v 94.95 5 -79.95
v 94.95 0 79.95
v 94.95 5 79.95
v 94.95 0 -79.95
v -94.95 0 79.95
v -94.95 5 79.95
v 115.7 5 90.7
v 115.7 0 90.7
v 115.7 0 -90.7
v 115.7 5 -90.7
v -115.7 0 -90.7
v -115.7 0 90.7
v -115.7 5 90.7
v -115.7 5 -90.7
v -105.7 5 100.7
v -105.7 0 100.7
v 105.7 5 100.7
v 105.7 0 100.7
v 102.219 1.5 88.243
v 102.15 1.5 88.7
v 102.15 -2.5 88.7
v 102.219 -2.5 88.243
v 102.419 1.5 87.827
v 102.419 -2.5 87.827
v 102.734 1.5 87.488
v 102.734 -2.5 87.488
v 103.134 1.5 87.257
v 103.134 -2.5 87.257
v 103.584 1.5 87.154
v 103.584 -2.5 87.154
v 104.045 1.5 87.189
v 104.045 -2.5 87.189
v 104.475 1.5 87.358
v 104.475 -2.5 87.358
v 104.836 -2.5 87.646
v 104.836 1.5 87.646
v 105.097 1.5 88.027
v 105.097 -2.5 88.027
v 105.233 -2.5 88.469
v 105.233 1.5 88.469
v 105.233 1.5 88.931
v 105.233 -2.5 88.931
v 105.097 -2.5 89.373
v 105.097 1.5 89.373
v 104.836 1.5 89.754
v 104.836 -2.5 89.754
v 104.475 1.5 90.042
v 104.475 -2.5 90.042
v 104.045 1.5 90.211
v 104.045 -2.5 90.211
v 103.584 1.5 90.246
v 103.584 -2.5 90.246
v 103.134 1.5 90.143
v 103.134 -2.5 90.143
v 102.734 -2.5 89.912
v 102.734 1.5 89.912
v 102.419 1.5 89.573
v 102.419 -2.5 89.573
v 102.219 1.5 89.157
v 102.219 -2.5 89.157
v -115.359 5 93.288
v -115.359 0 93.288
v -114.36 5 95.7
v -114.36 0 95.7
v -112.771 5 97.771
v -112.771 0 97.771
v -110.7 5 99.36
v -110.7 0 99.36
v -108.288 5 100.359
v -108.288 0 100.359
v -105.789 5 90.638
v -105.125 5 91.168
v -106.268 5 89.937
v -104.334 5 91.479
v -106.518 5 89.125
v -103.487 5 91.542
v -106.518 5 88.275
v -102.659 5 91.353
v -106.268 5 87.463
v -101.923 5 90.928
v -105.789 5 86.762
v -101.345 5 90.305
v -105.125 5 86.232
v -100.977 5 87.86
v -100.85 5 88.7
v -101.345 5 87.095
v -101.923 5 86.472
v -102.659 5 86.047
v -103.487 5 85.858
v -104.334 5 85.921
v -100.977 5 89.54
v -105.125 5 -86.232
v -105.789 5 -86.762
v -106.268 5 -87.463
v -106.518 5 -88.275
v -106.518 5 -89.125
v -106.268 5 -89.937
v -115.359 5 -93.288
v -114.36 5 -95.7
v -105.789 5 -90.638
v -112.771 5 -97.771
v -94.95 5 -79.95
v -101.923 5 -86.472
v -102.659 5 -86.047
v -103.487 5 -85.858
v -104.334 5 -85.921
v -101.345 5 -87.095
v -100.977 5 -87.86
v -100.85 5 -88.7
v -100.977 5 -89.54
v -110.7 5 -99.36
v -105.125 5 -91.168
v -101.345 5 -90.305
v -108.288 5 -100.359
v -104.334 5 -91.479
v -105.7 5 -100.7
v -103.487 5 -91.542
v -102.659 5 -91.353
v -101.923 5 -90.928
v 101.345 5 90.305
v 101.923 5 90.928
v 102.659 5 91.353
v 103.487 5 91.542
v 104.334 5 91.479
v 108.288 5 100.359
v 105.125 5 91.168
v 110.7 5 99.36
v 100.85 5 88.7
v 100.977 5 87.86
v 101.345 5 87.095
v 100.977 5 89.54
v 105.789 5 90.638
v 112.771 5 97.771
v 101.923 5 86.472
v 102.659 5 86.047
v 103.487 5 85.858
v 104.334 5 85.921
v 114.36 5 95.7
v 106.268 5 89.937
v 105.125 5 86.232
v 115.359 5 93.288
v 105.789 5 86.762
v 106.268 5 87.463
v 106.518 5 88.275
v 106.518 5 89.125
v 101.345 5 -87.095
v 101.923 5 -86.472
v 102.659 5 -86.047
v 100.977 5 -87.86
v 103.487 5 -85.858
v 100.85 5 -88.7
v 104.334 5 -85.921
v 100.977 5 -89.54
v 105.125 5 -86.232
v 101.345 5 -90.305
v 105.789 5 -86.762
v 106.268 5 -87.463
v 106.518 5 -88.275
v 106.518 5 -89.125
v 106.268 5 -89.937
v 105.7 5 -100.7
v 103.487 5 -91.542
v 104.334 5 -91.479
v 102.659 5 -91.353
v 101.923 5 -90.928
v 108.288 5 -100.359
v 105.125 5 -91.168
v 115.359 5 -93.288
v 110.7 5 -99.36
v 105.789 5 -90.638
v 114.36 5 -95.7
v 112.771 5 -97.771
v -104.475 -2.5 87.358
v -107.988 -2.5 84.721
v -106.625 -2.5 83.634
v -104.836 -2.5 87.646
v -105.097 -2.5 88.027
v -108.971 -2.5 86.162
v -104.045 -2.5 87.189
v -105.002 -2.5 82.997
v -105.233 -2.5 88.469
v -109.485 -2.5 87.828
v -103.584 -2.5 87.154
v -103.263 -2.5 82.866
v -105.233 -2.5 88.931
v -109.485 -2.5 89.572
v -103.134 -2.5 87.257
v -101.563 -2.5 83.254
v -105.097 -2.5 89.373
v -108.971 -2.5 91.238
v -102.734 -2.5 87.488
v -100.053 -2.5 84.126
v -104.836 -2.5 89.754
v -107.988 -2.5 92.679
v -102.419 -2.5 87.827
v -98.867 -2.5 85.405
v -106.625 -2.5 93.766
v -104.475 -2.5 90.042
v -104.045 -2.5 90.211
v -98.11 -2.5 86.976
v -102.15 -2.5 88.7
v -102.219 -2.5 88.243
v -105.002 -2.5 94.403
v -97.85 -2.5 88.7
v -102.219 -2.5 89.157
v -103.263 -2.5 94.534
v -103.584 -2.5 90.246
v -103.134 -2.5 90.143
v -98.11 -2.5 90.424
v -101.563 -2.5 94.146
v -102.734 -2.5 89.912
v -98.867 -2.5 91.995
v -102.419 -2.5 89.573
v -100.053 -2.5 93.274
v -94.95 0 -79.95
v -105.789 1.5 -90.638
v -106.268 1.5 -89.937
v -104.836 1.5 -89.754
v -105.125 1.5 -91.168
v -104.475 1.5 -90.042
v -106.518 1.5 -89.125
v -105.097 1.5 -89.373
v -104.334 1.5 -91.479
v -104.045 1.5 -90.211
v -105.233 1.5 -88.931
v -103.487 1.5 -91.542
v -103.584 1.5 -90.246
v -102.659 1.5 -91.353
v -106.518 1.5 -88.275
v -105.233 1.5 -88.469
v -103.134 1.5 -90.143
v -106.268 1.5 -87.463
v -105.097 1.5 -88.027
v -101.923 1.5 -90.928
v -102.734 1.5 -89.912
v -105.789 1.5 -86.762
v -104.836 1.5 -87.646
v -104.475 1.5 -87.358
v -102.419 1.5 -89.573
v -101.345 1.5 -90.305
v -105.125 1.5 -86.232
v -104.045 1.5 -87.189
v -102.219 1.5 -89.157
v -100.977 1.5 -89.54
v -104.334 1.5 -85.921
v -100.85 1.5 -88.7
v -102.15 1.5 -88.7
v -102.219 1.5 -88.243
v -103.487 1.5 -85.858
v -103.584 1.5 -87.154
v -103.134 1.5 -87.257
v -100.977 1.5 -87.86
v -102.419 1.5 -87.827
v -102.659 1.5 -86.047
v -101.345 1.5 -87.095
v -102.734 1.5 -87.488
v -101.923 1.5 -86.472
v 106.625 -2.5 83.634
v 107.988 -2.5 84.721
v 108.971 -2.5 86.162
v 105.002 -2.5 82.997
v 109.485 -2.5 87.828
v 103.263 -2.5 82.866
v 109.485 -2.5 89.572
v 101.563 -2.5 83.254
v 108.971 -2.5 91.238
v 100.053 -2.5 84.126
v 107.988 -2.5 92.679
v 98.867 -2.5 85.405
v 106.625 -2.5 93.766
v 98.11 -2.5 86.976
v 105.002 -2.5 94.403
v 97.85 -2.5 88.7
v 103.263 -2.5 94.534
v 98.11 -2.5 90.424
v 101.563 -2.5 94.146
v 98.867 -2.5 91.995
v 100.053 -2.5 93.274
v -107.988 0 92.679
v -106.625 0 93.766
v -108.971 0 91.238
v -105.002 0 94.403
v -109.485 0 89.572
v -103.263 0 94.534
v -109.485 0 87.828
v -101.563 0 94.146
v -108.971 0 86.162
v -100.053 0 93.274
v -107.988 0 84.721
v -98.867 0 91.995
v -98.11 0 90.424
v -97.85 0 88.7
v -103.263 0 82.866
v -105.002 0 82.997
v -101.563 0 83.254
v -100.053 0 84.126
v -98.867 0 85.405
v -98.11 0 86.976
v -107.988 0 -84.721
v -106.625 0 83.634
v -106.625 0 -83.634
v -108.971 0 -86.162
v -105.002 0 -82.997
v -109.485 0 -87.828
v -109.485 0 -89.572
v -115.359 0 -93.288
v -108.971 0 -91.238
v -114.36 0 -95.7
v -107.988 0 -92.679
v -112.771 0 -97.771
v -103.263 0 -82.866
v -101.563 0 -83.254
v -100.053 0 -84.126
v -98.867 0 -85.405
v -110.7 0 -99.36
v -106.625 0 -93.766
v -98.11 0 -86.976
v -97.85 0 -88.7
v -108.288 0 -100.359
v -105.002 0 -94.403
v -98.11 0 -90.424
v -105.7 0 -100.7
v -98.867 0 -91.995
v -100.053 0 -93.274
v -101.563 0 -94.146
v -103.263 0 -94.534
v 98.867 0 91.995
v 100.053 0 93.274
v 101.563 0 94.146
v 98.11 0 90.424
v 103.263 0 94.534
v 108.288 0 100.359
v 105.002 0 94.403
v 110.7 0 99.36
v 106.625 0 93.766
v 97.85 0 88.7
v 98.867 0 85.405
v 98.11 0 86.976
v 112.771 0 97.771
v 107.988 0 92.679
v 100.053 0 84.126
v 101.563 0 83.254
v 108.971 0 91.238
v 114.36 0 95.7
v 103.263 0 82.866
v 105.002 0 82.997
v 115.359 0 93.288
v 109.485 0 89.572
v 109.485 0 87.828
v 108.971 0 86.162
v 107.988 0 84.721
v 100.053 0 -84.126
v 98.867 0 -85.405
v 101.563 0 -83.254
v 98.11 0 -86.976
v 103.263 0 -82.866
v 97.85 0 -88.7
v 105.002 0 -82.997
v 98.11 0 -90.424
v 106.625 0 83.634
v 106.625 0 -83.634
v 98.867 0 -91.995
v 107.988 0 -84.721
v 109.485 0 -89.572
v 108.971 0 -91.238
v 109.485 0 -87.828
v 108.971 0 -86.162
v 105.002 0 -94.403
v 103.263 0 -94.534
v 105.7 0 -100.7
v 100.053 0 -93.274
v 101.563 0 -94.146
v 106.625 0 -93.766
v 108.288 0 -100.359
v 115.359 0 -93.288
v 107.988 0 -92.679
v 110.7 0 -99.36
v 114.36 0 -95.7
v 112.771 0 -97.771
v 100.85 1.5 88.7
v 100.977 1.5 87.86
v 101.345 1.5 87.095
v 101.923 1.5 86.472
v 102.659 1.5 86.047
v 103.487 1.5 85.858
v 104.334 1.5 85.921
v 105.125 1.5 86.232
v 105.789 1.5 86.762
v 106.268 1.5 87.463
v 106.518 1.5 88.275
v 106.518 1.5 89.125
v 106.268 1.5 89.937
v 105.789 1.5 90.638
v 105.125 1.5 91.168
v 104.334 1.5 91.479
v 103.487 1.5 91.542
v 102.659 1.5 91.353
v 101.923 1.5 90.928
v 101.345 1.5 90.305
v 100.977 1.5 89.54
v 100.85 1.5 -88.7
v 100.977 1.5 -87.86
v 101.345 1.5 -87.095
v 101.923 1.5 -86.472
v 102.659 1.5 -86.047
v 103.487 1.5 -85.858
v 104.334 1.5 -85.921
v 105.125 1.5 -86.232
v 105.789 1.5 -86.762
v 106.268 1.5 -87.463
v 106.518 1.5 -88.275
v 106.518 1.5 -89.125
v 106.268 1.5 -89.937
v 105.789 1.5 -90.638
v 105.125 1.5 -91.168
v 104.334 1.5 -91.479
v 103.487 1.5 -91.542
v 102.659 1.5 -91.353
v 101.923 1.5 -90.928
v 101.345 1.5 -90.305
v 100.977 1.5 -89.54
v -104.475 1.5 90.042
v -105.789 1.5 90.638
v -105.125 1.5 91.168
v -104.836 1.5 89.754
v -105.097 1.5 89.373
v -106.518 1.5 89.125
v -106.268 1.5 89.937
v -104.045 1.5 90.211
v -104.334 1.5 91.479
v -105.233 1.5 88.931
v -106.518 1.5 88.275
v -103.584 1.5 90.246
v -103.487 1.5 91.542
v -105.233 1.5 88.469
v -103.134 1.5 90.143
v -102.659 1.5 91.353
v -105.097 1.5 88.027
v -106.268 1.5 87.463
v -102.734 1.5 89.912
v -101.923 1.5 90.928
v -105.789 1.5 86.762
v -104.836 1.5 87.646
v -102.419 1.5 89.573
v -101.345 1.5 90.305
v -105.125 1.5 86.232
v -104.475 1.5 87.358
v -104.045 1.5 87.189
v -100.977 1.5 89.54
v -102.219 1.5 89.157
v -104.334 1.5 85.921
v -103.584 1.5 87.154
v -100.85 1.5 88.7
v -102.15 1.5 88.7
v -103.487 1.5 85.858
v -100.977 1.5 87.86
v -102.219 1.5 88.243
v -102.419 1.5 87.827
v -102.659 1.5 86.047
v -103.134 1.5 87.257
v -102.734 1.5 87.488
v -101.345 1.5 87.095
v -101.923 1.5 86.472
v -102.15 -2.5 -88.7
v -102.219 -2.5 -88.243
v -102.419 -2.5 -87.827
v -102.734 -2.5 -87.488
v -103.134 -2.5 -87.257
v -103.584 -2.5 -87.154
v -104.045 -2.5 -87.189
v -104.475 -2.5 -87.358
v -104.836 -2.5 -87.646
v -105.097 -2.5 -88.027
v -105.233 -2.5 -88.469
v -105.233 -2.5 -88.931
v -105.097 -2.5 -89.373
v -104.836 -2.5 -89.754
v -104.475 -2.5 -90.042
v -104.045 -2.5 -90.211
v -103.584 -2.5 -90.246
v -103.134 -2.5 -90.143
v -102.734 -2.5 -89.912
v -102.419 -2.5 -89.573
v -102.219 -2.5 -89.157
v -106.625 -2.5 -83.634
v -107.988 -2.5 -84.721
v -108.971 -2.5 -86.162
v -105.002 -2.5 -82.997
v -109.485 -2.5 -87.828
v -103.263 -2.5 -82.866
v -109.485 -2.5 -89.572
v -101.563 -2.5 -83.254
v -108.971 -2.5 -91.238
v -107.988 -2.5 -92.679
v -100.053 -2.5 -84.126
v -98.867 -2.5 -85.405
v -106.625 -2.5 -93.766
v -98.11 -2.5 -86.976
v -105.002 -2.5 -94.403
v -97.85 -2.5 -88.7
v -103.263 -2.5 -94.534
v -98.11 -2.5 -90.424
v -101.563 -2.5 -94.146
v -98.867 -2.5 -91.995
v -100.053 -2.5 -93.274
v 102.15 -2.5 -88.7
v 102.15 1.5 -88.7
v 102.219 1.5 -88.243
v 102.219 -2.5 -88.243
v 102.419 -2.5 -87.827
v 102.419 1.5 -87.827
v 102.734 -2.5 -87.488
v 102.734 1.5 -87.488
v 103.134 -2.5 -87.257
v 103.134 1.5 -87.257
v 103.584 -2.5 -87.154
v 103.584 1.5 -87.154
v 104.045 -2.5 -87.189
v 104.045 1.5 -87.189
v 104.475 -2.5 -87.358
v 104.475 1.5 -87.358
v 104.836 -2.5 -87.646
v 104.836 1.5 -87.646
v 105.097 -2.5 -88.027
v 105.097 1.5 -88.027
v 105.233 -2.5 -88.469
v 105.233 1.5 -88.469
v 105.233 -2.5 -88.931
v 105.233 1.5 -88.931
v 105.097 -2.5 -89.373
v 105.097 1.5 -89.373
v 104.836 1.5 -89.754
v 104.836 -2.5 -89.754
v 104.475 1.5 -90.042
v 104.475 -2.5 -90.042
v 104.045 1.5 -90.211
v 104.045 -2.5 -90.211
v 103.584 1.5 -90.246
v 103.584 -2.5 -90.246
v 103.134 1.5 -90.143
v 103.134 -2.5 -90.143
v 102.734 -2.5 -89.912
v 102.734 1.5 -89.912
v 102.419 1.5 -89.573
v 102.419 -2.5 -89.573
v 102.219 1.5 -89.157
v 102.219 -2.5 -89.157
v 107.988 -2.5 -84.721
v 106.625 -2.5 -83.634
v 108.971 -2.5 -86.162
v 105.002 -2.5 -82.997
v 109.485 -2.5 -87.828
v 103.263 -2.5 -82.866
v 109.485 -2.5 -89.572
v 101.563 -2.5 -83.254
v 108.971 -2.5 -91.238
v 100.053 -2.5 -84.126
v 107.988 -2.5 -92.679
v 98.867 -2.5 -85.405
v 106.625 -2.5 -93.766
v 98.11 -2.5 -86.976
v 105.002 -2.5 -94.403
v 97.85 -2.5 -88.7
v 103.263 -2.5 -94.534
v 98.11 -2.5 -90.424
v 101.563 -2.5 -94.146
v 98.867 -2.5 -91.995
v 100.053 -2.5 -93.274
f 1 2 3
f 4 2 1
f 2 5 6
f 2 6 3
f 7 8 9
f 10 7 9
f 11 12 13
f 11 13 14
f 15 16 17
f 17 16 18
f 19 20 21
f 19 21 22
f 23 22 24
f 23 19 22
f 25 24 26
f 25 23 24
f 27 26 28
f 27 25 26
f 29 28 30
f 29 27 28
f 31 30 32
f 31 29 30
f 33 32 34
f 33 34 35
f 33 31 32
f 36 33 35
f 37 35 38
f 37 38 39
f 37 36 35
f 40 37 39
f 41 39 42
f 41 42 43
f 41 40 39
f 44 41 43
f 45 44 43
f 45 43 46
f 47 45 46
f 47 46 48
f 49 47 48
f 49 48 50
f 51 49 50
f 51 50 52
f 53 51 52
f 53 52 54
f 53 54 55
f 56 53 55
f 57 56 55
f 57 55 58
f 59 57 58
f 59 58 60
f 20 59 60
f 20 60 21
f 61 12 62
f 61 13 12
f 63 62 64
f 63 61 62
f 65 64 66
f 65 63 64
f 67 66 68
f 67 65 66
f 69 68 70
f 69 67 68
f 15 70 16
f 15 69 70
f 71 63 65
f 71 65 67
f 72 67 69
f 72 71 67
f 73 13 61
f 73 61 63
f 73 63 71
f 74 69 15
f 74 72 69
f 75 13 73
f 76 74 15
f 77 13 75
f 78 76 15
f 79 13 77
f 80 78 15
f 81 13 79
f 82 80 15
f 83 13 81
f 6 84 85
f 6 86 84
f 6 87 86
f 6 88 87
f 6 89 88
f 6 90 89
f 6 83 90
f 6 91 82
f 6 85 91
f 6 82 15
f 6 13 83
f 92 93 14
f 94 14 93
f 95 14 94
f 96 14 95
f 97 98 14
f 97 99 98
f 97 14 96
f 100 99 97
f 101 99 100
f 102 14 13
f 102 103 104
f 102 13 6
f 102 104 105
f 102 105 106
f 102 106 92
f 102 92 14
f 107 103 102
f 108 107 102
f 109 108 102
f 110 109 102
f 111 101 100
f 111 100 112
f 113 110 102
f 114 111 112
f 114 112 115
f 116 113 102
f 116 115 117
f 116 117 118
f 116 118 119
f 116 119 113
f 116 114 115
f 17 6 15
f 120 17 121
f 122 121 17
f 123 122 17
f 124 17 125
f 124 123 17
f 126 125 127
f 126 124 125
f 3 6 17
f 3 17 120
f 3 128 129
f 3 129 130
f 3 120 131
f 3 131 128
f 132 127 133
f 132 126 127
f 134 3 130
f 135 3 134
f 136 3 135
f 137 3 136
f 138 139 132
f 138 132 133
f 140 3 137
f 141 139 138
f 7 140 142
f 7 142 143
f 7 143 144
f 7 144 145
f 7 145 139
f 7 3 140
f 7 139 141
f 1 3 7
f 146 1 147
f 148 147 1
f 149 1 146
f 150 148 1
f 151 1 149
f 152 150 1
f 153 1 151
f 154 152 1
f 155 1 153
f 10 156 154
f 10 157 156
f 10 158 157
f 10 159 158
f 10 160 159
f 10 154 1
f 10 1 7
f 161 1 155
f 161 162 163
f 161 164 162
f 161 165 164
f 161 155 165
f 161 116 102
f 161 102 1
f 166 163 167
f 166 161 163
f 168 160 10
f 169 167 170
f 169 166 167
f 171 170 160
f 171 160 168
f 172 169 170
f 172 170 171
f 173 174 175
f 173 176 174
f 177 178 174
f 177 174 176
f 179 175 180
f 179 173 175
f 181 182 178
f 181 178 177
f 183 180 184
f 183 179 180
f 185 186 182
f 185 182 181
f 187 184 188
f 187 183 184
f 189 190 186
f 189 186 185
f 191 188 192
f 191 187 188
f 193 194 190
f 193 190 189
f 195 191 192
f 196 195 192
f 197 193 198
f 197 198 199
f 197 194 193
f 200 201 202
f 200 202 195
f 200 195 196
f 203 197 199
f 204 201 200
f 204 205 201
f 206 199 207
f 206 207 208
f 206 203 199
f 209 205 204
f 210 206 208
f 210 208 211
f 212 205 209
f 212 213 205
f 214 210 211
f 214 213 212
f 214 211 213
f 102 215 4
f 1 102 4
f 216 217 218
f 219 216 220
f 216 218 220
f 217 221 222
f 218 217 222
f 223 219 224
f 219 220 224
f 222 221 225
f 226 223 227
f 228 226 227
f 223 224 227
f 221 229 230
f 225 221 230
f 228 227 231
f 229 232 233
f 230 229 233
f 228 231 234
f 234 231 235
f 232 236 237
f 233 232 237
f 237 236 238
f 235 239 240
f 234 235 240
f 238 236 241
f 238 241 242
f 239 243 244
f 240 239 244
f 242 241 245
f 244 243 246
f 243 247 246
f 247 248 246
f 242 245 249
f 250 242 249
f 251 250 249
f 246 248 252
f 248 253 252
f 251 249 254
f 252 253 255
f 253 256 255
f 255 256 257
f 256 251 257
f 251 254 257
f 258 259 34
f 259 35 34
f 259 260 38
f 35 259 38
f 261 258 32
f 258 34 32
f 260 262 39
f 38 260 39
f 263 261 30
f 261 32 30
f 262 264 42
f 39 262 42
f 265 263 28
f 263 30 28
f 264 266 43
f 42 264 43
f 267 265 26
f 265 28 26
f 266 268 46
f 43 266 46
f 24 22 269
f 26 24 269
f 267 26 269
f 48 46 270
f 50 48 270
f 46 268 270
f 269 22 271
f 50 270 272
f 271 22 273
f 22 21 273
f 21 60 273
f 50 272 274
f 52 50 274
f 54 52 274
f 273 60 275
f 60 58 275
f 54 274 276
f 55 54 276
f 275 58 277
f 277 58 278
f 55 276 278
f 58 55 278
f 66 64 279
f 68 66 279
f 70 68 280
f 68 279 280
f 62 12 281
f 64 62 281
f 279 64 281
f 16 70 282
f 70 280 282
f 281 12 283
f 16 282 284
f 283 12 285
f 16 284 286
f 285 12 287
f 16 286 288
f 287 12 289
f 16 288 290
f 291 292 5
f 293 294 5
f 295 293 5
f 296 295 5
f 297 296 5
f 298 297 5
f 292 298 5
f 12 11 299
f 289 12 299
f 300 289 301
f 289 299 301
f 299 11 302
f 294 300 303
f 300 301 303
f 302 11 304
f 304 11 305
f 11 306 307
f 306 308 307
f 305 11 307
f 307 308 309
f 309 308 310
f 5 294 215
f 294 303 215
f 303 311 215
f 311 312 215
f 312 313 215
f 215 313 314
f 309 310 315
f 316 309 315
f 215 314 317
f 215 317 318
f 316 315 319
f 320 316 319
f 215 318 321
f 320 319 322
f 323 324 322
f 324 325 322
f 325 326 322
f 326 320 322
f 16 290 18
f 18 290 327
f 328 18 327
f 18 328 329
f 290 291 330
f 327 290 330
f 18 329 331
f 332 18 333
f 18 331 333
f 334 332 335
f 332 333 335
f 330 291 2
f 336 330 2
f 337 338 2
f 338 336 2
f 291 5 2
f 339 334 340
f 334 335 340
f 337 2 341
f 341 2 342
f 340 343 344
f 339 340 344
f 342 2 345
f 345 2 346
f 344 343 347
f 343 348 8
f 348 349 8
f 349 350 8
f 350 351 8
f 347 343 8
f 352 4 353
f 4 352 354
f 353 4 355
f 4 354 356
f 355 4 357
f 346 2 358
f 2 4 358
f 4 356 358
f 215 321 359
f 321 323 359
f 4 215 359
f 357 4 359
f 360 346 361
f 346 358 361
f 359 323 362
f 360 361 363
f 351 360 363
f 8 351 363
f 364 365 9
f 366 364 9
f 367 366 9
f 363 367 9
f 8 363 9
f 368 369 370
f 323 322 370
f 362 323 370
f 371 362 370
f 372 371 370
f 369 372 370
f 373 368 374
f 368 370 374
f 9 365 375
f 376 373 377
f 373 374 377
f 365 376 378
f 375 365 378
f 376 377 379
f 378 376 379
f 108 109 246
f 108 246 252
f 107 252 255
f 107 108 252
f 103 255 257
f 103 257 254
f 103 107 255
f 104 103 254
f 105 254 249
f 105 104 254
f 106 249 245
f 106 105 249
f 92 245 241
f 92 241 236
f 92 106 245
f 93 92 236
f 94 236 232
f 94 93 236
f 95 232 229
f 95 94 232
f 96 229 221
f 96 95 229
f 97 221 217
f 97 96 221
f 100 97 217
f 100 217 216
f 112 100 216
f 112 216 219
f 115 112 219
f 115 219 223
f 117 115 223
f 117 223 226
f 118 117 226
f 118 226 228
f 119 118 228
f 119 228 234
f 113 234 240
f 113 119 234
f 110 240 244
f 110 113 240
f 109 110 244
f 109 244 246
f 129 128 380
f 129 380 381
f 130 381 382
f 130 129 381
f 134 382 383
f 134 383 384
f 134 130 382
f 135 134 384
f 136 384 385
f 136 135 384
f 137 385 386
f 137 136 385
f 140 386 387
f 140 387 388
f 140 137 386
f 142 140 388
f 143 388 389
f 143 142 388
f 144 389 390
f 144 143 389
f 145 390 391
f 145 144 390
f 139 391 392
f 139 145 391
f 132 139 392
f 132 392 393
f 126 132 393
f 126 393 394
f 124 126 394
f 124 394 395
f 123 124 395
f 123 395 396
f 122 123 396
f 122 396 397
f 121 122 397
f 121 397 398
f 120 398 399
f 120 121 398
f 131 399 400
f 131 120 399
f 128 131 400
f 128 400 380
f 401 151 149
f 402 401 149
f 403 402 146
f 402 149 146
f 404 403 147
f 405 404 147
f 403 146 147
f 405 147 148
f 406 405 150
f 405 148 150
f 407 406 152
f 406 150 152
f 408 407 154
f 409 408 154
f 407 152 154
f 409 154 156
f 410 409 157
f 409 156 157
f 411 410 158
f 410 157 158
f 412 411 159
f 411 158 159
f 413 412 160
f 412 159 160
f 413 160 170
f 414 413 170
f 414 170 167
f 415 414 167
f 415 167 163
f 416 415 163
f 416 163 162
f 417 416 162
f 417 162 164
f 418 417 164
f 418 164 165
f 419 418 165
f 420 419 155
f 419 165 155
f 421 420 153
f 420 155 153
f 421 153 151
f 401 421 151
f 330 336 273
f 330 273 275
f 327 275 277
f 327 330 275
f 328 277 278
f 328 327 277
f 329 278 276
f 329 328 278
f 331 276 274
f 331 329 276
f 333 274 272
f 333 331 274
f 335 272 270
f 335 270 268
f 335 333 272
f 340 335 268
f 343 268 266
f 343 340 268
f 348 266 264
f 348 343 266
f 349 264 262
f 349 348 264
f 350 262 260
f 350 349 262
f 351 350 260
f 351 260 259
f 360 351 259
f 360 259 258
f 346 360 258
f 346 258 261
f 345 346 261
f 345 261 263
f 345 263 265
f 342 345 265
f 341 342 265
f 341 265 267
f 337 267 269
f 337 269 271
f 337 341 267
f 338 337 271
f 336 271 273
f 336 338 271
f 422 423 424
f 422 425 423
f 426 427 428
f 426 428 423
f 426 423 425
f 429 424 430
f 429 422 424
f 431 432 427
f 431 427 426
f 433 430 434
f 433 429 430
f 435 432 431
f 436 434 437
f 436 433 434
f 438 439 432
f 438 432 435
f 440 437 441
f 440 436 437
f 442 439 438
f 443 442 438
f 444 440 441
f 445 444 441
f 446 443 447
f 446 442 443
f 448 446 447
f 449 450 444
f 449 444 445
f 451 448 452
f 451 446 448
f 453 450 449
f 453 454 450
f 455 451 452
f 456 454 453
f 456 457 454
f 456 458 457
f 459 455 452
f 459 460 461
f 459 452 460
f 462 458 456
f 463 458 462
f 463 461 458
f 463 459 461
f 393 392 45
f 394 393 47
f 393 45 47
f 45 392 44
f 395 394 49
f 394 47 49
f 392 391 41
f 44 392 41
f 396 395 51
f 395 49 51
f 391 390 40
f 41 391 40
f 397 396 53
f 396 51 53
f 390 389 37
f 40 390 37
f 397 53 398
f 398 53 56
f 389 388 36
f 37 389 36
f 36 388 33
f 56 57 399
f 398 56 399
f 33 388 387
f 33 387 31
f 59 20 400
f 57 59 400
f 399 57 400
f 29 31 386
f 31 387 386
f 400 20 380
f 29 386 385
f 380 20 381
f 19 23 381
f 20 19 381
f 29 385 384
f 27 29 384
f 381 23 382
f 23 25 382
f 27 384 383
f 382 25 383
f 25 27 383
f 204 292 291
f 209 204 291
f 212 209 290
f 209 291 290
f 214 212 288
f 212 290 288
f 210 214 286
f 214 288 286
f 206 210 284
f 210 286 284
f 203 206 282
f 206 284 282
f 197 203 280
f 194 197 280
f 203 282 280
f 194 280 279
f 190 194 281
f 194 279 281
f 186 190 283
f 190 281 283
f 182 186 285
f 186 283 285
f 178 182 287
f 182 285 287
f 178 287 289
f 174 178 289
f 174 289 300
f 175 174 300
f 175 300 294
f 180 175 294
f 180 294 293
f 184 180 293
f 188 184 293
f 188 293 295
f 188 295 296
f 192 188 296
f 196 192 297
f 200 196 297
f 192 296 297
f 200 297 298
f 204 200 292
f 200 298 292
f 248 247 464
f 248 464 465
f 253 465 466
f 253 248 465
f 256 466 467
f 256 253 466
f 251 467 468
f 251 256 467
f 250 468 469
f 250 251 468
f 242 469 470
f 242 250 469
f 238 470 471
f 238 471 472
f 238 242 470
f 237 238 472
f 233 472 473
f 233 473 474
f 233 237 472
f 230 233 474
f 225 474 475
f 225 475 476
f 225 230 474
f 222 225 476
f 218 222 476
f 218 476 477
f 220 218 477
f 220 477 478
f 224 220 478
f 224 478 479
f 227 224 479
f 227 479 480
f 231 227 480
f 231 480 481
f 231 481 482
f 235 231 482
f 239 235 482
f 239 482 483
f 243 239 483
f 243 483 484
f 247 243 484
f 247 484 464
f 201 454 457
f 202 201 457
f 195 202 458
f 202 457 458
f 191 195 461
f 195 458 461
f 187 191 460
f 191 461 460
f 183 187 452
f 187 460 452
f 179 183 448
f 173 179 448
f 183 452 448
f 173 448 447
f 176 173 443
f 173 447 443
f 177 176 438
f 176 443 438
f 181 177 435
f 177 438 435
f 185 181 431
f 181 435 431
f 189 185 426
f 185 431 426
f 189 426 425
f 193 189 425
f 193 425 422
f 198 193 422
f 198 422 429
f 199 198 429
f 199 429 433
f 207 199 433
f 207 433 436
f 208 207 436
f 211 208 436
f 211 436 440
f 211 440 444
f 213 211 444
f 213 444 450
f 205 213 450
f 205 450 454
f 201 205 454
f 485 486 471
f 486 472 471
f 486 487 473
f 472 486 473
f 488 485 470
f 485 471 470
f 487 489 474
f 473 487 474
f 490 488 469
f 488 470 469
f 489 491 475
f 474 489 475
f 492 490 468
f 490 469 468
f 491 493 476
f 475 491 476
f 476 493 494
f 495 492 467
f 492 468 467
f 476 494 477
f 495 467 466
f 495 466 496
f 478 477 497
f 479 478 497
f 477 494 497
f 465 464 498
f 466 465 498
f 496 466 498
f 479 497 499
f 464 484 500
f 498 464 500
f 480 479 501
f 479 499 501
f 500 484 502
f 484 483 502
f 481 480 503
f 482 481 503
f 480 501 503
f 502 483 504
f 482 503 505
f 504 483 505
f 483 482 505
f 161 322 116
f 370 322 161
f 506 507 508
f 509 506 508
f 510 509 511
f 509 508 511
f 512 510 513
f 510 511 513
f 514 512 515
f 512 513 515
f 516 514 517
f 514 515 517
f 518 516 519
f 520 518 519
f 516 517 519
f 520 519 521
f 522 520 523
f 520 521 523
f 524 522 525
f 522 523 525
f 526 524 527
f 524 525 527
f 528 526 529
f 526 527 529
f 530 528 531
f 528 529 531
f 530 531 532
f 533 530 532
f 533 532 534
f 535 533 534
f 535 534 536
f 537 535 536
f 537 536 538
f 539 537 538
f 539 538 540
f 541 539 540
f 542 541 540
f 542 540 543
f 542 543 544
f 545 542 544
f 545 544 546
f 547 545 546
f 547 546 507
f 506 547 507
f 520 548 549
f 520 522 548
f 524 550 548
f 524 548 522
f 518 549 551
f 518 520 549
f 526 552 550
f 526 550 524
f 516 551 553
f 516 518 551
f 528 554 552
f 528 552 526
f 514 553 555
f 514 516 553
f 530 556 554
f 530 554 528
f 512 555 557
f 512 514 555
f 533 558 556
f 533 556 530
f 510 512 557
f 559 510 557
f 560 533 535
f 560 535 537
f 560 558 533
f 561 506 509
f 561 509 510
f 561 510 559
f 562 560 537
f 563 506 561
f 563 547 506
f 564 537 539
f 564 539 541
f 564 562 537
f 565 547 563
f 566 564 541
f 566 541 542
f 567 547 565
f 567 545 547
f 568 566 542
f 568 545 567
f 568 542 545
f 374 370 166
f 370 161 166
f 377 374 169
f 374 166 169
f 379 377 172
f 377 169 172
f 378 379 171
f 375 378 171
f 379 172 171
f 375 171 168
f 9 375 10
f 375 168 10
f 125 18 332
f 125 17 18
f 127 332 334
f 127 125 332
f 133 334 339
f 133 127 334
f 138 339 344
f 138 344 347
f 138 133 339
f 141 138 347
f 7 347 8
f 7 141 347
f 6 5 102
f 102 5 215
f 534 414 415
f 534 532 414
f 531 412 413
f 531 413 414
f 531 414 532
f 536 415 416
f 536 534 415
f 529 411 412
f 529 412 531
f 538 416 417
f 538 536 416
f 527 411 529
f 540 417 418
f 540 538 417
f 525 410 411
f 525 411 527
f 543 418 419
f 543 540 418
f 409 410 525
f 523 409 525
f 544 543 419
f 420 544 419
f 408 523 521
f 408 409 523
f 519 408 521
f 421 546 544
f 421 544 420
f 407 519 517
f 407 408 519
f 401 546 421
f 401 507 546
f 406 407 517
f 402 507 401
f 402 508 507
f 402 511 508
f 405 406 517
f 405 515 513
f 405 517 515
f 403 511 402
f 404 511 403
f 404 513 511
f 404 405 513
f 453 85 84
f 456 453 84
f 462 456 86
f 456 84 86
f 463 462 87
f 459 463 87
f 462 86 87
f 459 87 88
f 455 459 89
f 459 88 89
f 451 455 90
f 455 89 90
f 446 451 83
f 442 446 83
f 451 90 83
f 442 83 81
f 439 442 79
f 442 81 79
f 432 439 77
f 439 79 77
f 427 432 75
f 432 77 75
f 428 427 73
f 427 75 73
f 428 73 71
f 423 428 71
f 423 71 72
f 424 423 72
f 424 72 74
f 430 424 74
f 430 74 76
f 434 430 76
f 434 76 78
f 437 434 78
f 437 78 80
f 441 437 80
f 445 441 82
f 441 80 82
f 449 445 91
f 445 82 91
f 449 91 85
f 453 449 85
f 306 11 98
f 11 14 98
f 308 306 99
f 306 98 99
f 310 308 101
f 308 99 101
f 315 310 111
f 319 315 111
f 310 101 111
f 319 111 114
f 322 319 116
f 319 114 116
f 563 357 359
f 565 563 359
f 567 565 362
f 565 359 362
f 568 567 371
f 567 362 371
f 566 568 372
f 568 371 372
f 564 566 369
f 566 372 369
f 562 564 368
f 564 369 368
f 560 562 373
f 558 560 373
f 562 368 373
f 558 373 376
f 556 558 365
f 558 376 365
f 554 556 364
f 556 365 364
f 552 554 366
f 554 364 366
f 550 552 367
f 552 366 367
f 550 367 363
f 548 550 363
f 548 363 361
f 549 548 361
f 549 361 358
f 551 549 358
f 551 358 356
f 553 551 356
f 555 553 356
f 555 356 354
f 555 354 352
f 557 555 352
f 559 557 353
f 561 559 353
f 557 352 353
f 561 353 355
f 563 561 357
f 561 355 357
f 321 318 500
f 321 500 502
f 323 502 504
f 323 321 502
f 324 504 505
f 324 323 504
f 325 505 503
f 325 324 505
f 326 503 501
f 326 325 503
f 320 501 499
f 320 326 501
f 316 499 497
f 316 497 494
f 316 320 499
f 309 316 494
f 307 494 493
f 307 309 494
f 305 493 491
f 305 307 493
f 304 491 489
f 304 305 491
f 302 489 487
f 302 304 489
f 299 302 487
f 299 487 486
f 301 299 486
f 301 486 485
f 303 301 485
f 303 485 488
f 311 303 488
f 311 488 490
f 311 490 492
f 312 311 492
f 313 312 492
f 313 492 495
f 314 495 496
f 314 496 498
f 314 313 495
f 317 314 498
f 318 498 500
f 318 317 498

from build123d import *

# Parameters (mm, degrees)
SKETCH1_W               = 231.4
SKETCH1_H               = 201.4
SKETCH1_W_2             = 189.9
SKETCH1_H_2             = 159.9
BOSS_EXTRUDE1_DEPTH     = 5
FILLET1_R               = 10
SKETCH2_R               = 5.85
BOSS_EXTRUDE2_DEPTH     = 2.5
SKETCH3_R               = 1.55
CUT_EXTRUDE1_DEPTH      = 7.5
SKETCH4_R               = 2.85
CUT_EXTRUDE2_DEPTH      = 3.5
MIRROR4_COPY_1_SKETCH_R = 5.85
MIRROR4_COPY_1_DEPTH    = 2.5
MIRROR4_COPY_2_SKETCH_R = 1.55
MIRROR4_COPY_2_DEPTH    = 7.5
MIRROR4_COPY_3_SKETCH_R = 2.85
MIRROR4_COPY_3_DEPTH    = 3.5


with BuildPart() as part:
    # Sketch1 → Boss-Extrude1 (new body)
    with BuildSketch(Plane(origin=(0, 0, 0), x_dir=(1, 0, 0), z_dir=(0, 1, 0))):
        Rectangle(SKETCH1_W, SKETCH1_H)
        Rectangle(SKETCH1_W_2, SKETCH1_H_2, mode=Mode.SUBTRACT)
    extrude(amount=BOSS_EXTRUDE1_DEPTH)

    # Fillet1
    fillet1_edges = [part.edges().sort_by_distance(p)[0] for p in [
        (-115.7, 2.5, -100.7),
        (115.7, 2.5, -100.7),
        (115.7, 2.5, 100.7),
        (-115.7, 2.5, 100.7),
    ]]
    fillet(fillet1_edges, radius=FILLET1_R)

    # Sketch2 → Boss-Extrude2 (add)
    with BuildSketch(Plane.XZ):
        with Locations((-103.7, 88.7)):
            Circle(SKETCH2_R)
    boss_extrude2 = extrude(amount=BOSS_EXTRUDE2_DEPTH)

    # Sketch3 → Cut-Extrude1 (cut)
    with BuildSketch(Plane(origin=(0, 5, 0), x_dir=(1, 0, 0), z_dir=(0, 1, 0))):
        with Locations((-103.7, -88.7)):
            Circle(SKETCH3_R)
    cut_extrude1 = extrude(amount=-CUT_EXTRUDE1_DEPTH, mode=Mode.SUBTRACT)

    # Sketch4 → Cut-Extrude2 (cut)
    with BuildSketch(Plane(origin=(0, 5, 0), x_dir=(1, 0, 0), z_dir=(0, 1, 0))):
        with Locations((-103.7, -88.7)):
            Circle(SKETCH4_R)
    cut_extrude2 = extrude(amount=-CUT_EXTRUDE2_DEPTH, mode=Mode.SUBTRACT)

    # Mirror3: Boss-Extrude2, Cut-Extrude1, Cut-Extrude2 across plane
    add(boss_extrude2.mirror(Plane(origin=(0, 0, 0), x_dir=(0, 0, 1), z_dir=(1, 0, 0))))
    add(cut_extrude1.mirror(Plane(origin=(0, 0, 0), x_dir=(0, 0, 1), z_dir=(1, 0, 0))), mode=Mode.SUBTRACT)
    add(cut_extrude2.mirror(Plane(origin=(0, 0, 0), x_dir=(0, 0, 1), z_dir=(1, 0, 0))), mode=Mode.SUBTRACT)

    # Mirror4: Boss-Extrude2, Cut-Extrude1, Cut-Extrude2 across plane
    add(boss_extrude2.mirror(Plane.XY))
    add(cut_extrude1.mirror(Plane.XY), mode=Mode.SUBTRACT)
    add(cut_extrude2.mirror(Plane.XY), mode=Mode.SUBTRACT)

    # Mirror4 copy 1 sketch → Mirror4 copy 1 (add)
    with BuildSketch(Plane(origin=(0, 0, 0), x_dir=(-1, 0, 0), z_dir=(0, -1, 0))):
        with Locations((-103.7, 88.7)):
            Circle(MIRROR4_COPY_1_SKETCH_R)
    extrude(amount=MIRROR4_COPY_1_DEPTH)

    # Mirror4 copy 2 sketch → Mirror4 copy 2 (cut)
    with BuildSketch(Plane(origin=(0, 5, 0), x_dir=(-1, 0, 0), z_dir=(0, 1, 0))):
        with Locations((-103.7, -88.7)):
            Circle(MIRROR4_COPY_2_SKETCH_R)
    extrude(amount=-MIRROR4_COPY_2_DEPTH, mode=Mode.SUBTRACT)

    # Mirror4 copy 3 sketch → Mirror4 copy 3 (cut)
    with BuildSketch(Plane(origin=(0, 5, 0), x_dir=(-1, 0, 0), z_dir=(0, 1, 0))):
        with Locations((-103.7, -88.7)):
            Circle(MIRROR4_COPY_3_SKETCH_R)
    extrude(amount=-MIRROR4_COPY_3_DEPTH, mode=Mode.SUBTRACT)


solid = part.part
